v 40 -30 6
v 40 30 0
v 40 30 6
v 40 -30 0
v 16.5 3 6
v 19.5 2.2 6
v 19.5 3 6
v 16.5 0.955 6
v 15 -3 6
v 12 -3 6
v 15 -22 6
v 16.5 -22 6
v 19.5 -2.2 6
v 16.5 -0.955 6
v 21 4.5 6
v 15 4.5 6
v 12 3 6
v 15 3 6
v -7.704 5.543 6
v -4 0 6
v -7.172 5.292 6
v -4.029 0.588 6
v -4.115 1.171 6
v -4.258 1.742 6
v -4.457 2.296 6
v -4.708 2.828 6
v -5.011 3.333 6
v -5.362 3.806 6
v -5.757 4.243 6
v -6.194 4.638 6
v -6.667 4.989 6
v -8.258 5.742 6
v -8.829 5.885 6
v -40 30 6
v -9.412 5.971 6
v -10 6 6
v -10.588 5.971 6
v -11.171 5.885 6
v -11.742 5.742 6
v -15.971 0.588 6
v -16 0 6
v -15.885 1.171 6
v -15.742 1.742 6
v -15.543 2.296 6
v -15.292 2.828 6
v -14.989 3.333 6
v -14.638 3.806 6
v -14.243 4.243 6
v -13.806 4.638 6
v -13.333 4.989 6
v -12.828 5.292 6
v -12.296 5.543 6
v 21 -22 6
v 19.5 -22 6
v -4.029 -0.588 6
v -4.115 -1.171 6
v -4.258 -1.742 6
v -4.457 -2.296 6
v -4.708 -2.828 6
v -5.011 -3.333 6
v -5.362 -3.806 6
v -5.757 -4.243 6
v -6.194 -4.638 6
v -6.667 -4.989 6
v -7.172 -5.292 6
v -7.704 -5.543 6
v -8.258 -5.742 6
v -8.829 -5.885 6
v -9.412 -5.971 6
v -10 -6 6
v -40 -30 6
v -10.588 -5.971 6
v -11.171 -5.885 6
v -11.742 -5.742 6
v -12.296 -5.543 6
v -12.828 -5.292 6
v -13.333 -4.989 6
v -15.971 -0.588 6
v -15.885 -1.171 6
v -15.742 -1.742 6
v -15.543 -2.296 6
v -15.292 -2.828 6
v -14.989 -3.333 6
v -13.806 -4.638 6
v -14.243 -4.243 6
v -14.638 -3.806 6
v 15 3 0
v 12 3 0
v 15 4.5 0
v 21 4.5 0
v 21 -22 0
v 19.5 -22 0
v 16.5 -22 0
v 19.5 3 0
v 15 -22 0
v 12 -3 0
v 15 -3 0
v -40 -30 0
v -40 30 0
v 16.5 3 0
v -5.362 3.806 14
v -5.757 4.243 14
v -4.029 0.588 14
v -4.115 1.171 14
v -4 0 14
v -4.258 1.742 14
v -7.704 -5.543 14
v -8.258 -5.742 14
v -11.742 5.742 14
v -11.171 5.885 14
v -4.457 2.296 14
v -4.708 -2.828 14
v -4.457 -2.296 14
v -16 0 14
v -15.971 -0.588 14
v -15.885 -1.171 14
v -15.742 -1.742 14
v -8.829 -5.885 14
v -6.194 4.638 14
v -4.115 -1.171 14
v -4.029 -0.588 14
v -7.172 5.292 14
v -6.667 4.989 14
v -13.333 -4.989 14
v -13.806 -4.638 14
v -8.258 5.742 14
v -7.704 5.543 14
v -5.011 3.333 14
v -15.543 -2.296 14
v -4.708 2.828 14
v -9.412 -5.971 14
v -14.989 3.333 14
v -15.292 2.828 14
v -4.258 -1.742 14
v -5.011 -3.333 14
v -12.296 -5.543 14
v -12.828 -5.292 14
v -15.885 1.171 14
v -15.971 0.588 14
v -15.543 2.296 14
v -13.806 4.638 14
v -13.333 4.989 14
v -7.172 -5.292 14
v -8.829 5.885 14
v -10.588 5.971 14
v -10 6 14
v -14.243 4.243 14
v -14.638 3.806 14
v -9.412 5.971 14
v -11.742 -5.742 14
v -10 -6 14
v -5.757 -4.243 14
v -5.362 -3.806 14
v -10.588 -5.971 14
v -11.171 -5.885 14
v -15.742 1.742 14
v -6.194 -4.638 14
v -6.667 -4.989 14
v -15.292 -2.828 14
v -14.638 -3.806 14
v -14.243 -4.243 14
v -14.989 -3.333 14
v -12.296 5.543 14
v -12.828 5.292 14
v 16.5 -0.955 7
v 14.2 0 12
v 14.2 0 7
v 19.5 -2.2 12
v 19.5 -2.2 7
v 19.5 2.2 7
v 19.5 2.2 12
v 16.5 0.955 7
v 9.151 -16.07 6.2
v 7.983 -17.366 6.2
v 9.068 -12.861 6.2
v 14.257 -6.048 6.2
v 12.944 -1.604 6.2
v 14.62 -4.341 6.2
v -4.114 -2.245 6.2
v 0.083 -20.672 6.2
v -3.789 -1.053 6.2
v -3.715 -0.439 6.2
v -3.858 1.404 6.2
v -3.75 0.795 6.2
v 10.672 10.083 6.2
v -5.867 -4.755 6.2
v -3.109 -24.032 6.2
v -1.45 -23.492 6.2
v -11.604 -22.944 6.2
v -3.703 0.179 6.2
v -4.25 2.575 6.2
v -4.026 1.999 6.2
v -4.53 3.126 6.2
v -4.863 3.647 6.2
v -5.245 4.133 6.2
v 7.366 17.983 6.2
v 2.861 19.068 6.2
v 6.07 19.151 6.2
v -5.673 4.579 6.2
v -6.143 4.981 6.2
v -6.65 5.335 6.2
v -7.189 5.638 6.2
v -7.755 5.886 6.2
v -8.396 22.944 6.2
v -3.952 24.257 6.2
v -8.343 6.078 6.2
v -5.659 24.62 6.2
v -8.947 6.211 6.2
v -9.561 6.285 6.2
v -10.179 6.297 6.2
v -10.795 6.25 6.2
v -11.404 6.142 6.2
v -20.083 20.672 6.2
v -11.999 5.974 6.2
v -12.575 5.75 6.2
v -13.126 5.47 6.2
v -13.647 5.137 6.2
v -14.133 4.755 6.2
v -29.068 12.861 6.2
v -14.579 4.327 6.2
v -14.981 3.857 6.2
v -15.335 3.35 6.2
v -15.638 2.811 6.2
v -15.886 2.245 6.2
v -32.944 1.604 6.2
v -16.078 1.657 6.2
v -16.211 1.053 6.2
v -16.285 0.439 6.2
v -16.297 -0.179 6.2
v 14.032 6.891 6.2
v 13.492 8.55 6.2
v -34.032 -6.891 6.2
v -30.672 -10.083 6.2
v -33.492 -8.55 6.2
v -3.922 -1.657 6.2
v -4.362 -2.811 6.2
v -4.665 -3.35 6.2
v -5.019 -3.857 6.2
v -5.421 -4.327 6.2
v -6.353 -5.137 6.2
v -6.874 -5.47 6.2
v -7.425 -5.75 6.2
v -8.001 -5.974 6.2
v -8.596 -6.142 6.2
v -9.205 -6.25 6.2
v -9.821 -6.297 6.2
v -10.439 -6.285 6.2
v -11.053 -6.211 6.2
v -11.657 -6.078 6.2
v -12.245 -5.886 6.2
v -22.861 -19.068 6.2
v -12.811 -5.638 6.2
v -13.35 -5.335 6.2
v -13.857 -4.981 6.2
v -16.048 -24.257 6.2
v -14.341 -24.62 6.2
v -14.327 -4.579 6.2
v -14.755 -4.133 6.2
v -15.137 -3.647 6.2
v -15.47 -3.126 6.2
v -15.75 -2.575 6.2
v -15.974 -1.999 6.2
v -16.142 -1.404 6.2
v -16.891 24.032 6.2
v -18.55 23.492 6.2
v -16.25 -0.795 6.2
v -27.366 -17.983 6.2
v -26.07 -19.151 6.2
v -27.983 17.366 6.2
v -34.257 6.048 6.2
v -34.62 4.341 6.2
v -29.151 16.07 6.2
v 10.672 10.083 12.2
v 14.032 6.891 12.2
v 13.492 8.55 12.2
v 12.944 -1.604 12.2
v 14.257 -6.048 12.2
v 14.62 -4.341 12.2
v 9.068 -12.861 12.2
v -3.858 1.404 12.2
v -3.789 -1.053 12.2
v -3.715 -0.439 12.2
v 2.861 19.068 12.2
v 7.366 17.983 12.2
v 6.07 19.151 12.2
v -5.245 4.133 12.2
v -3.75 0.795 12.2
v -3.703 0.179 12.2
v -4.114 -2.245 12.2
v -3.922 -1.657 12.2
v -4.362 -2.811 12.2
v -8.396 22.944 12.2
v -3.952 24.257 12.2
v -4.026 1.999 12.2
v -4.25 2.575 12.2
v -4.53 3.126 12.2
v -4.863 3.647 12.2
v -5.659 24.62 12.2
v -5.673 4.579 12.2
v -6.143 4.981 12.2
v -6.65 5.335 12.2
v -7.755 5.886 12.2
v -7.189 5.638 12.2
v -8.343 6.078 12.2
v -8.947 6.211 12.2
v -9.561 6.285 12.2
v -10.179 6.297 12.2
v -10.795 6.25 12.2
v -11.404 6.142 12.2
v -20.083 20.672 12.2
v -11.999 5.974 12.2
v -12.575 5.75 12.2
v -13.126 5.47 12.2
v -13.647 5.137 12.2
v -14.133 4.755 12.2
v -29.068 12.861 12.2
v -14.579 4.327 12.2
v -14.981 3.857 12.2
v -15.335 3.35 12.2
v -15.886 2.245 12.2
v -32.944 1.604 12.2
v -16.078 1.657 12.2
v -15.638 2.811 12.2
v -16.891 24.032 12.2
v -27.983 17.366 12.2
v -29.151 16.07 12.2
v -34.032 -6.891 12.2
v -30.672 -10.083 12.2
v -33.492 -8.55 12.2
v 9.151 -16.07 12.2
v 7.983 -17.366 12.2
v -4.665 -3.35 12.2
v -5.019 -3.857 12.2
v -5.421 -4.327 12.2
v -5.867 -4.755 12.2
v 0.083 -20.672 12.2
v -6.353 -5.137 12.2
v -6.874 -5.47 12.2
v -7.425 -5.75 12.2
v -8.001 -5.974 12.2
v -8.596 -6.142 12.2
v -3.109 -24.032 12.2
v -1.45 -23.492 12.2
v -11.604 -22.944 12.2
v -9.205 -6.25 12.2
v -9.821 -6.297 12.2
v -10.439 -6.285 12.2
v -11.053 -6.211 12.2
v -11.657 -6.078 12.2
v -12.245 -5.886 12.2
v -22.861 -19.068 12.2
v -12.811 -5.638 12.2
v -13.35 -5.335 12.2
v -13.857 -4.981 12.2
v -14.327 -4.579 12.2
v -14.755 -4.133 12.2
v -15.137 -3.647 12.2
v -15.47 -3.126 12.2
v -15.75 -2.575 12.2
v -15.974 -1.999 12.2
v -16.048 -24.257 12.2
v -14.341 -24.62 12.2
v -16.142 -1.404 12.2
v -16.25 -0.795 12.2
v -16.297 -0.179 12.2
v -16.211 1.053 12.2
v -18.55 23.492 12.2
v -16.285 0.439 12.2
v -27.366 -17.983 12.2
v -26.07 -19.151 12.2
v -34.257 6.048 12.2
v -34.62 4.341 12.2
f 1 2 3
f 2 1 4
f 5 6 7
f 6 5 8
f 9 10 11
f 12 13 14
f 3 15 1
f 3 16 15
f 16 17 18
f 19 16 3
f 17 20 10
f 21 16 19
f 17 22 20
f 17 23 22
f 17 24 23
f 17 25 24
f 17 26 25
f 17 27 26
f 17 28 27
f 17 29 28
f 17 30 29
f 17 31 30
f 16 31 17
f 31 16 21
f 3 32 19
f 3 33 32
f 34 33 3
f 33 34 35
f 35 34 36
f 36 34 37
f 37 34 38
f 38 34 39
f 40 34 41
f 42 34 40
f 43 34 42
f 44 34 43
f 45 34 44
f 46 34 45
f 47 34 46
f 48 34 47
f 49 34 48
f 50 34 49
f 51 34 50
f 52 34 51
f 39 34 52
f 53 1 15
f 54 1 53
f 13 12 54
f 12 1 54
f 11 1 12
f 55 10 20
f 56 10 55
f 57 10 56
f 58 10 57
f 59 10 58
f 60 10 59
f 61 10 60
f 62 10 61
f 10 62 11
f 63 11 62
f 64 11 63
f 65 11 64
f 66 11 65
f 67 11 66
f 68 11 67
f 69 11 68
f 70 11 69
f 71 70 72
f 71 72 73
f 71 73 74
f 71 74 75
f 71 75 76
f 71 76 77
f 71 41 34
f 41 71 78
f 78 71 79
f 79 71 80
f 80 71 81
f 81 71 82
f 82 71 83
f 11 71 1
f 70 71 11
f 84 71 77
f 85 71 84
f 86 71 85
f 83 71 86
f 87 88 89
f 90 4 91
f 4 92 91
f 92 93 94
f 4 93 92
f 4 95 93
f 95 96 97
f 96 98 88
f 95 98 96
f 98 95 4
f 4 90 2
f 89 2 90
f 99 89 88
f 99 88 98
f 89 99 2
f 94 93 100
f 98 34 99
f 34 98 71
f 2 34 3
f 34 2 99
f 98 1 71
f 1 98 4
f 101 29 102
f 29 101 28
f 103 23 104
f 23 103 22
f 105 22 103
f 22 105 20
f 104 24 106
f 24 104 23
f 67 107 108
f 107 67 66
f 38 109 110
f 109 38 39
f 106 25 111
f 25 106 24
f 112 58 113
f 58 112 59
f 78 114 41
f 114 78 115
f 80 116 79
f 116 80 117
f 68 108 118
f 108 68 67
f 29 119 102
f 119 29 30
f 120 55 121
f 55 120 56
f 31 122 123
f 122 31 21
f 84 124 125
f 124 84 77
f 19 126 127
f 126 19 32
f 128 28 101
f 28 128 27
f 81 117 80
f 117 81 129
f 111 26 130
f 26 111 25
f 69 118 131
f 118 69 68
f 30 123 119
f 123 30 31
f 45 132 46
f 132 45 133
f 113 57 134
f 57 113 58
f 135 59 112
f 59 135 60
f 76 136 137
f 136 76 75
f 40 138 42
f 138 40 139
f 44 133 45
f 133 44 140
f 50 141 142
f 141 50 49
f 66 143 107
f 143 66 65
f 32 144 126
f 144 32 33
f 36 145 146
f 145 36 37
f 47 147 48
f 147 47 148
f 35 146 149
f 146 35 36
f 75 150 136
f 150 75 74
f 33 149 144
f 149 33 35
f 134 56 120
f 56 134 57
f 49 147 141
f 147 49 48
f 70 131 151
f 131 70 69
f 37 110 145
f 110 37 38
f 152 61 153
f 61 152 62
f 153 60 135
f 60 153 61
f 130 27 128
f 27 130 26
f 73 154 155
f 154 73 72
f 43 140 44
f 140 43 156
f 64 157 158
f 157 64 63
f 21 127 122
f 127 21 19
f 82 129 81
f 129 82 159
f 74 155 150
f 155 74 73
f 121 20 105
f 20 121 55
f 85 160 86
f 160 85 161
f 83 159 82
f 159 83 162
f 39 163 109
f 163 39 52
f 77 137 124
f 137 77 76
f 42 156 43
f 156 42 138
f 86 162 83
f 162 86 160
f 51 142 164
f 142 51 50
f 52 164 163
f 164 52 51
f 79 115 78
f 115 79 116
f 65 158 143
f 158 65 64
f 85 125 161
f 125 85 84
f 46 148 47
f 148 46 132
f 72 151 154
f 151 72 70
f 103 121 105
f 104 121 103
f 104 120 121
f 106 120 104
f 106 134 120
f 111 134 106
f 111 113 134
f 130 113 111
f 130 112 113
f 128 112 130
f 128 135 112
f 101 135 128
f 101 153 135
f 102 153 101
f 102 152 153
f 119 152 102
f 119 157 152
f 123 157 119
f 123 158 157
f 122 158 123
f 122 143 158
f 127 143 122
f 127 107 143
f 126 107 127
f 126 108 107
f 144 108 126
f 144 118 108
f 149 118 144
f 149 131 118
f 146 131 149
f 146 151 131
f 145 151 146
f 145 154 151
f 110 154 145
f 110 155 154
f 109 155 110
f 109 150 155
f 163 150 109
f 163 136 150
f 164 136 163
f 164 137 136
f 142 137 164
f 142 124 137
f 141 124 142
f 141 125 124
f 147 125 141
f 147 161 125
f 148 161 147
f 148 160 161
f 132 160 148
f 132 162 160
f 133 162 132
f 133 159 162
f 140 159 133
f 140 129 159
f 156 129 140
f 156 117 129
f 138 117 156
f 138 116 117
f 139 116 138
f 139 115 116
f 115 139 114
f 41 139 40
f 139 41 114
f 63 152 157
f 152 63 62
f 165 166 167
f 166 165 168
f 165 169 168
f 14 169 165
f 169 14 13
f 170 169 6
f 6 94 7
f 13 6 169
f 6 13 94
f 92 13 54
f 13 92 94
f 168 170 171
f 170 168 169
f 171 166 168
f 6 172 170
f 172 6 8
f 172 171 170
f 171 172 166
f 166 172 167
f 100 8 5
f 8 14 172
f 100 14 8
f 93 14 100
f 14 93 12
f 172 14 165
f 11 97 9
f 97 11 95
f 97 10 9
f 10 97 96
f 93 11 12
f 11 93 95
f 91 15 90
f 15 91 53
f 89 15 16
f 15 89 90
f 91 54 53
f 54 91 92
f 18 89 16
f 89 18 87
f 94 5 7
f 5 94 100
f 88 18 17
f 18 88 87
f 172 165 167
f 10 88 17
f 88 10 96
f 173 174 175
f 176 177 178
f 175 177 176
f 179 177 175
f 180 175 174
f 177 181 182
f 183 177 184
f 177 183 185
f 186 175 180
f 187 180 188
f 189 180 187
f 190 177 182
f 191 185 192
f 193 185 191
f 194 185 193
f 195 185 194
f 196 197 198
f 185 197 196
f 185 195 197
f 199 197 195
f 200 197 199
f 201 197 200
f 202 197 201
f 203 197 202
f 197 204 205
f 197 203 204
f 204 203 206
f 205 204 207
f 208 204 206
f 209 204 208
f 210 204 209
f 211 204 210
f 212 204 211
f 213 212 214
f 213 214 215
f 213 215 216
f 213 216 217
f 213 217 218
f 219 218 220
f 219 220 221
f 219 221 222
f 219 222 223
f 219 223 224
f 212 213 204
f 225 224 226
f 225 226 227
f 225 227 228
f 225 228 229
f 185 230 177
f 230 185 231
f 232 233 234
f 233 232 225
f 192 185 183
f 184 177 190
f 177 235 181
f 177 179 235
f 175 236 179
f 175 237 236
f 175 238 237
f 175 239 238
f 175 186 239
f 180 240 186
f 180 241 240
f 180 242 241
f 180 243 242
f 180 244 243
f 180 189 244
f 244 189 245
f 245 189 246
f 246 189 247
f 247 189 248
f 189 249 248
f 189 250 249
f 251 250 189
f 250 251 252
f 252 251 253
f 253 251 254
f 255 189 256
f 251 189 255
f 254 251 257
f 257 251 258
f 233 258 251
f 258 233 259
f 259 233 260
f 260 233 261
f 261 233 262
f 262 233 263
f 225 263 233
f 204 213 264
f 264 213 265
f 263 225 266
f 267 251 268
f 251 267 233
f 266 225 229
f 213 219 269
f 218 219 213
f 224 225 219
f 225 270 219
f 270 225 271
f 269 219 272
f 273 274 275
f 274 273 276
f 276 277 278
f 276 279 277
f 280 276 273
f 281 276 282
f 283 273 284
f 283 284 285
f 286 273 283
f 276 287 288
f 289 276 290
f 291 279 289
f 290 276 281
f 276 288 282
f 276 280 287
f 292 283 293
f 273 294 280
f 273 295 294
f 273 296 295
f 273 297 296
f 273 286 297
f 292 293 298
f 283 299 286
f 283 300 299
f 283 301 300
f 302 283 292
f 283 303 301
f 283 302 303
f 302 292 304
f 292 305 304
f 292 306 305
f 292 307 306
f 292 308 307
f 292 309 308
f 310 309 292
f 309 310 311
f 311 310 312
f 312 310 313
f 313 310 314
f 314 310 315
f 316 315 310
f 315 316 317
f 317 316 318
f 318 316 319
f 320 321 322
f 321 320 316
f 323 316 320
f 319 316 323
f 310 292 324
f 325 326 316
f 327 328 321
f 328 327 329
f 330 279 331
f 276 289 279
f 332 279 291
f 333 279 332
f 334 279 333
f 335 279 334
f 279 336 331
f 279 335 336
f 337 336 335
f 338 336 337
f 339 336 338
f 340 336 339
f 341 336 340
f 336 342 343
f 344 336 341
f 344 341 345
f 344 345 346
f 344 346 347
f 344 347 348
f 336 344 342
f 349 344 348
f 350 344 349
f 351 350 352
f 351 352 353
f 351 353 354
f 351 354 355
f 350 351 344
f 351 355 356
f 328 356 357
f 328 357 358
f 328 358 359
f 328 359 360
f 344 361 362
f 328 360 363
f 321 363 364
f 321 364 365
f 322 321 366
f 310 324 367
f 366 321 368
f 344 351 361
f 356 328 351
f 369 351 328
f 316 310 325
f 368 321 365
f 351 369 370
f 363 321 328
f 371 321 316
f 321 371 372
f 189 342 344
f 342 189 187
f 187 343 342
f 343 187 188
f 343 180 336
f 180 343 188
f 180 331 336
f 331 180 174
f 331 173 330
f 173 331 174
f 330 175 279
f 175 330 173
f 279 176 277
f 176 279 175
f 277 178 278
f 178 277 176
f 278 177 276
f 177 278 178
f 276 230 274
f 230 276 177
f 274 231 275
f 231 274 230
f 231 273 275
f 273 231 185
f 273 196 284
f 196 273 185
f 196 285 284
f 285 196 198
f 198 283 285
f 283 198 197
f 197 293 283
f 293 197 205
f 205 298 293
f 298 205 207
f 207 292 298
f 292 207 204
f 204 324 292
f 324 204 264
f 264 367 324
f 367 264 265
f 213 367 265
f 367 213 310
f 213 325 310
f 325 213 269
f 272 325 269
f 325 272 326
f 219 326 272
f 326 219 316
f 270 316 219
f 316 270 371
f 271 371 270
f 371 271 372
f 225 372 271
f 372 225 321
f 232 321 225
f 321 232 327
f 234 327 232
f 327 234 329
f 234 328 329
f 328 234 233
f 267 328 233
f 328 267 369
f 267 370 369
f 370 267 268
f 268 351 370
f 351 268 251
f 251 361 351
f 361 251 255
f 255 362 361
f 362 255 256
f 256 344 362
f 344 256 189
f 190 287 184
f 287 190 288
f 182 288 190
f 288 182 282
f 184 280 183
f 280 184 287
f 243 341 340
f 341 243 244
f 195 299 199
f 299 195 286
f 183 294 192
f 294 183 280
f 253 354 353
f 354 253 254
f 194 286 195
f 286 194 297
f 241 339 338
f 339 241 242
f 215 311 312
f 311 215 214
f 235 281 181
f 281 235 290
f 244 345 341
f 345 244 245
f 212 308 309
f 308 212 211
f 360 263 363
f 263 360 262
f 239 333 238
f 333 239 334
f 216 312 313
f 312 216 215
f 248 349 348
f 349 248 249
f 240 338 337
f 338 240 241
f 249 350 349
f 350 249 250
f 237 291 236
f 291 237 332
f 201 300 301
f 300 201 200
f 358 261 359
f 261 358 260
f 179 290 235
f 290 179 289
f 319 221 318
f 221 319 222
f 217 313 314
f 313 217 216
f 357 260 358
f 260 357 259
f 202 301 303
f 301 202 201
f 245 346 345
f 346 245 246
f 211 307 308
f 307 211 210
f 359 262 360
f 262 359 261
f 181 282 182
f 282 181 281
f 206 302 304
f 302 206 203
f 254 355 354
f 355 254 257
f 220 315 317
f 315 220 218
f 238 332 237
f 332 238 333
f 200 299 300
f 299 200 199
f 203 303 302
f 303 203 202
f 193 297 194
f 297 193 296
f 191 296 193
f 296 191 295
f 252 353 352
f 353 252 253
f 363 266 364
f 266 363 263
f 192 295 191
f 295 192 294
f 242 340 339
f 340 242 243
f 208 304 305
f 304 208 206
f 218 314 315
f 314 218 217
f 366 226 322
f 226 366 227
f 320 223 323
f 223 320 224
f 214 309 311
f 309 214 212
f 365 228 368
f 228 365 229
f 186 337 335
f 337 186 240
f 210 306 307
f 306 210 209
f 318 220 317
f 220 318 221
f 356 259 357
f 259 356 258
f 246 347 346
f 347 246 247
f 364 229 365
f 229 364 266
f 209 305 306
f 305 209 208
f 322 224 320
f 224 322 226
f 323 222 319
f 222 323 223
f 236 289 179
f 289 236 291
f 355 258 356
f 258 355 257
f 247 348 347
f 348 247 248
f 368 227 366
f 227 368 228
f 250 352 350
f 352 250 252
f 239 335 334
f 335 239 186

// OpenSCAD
/* Ratchet wheel with spring pawl - desk demo, PLA, 0.4mm nozzle, no supports.
   Wheel (~50mm, 12 teeth) turns on a post; pawl on a flexible arm cut from the
   base plate bends aside as teeth pass (free way) and blocks reverse.
   Free way: clockwise seen from above (+z), i.e. negative rotation about +z. */
part = "assembly"; // [wheel:Wheel, base:Base, assembly:Assembly]

cadverify_only = "";
module instance(name, part, unit = 1) {
    echo(cadverify_instance = [name, part, unit]);
    if (cadverify_only == "" || cadverify_only == name) children();
}

// ---------- parameters (mm) ----------
Rtip = 25;          // wheel outer radius (50 mm across)
Rroot = 23;         // wheel root radius (tooth height 2 mm)
wheel_t = 6;        // wheel thickness
hole_D = 12.6;      // wheel centre hole diameter
post_D = 12;        // base post diameter (0.6 mm play)
post_h = 8;         // post height above base top
base_t = 6;         // base plate thickness
base_x = 80;
base_y = 60;
wheel_cx = -10;     // wheel centre in base/assembly XY
wheel_cy = 0;
wheel_gap = 0.2;    // wheel bottom above base top
wheel_lift_z = base_t + wheel_gap;   // 6.2 wheel bottom in assembly
post_top_z = base_t + post_h;        // 14
pawl_tip_x = 14.2;  // pawl tip (0.8 mm inside tip circle, 1.2 mm off root)
beam_x0 = 16.5; beam_x1 = 19.5;      // flexible arm: 3 mm wide ...
beam_y0 = -22; beam_y1 = 3;          // ... 25 mm long, fixed at south, free at north
slot_w = 1.5;       // slot width (clears a 0.4 mm nozzle)
pawl_h = 6;         // pawl height above plate (meets the wheel band 6.2..12.2)
rest_angle = -4.0;  // wheel rest rotation: gullet centred on pawl tip

// tooth k: root at 30k, shallow rise to tip at 30k+20, tip land to +24, steep drop to root at 30k+30
function wheel_pts() = [
    for(k=[0:11]) for(j=[0:2])
        j==0 ? [Rroot*cos(k*30), Rroot*sin(k*30)]
      : j==1 ? [Rtip*cos(k*30+20), Rtip*sin(k*30+20)]
             : [Rtip*cos(k*30+24), Rtip*sin(k*30+24)]
];

module wheel() {
    difference() {
        linear_extrude(height=wheel_t, convexity=4)
            polygon(points=wheel_pts());
        translate([0,0,-1]) cylinder(d=hole_D, h=wheel_t+2, $fn=64);
    }
}

module base() {
    difference() {
        union() {
            // plate
            translate([-base_x/2, -base_y/2, 0]) cube([base_x, base_y, base_t]);
            // post the wheel turns on
            translate([wheel_cx, wheel_cy, base_t]) cylinder(d=post_D, h=post_h, $fn=64);
            // pawl wedge: tip near the wheel, root fused onto the free end of the arm
            translate([0,0,base_t]) linear_extrude(height=pawl_h, convexity=2)
                polygon(points=[[pawl_tip_x, 0],[beam_x1, 2.2],[beam_x1, -2.2]]);
        }
        // U-slot freeing the arm (one connected through opening) + window under pawl tip
        translate([beam_x0-slot_w, beam_y0, -1]) cube([slot_w, 19, base_t+2]); // west x15..16.5 y-22..-3
        translate([beam_x1, beam_y0, -1]) cube([slot_w, 26.5, base_t+2]);       // east x19.5..21 y-22..4.5
        translate([beam_x0-slot_w, beam_y1, -1]) cube([6, slot_w, base_t+2]);   // north x15..21 y3..4.5
        translate([12, -3, -1]) cube([4.5, 6, base_t+2]);                        // window x12..16.5 y-3..3
    }
}

module assembly() {
    instance("base_inst", "base", 1) base();
    instance("wheel_inst", "wheel", 1)
        translate([wheel_cx, wheel_cy, wheel_lift_z]) rotate([0,0,rest_angle]) wheel();
}

// ---------- specs (computed from parameters) ----------
wheel_spec = [
    ["bounds", [[-Rtip, -Rtip, 0], [Rtip, Rtip, wheel_t]]],
    ["bodies", 1],
    ["through_holes", 1],
    ["support_faces", [["bed", "-z", 800]]],
    ["overhangs_allowed", []],
    ["copies", 1],
    ["details", [
        ["axle_hole", "hole", [0, 0, wheel_t+4], [0, 0, -1], [[0, hole_D], [wheel_t, hole_D]]],
        ["rim_thick", "thickness", [15, 0, wheel_t+4], [0, 0, -1], wheel_t],
        ["tooth0", "material", [[22.9, 8.0, 0], [24.1, 9.1, wheel_t]], 0.2],
        ["tooth4", "material", [[-19.8, 15.5, 0], [-18.5, 16.6, wheel_t]], 0.2],
        ["tooth8", "material", [[-5.0, -25.2, 0], [-3.7, -24.0, wheel_t]], 0.2]
    ]]
];

base_spec = [
    ["bounds", [[-base_x/2, -base_y/2, 0], [base_x/2, base_y/2, post_top_z]]],
    ["bodies", 1],
    ["through_holes", 1],
    ["support_faces", [["bed", "-z", 2000]]],
    ["overhangs_allowed", [["pawl bridges slot", [[14, -1.5, 5.9], [17, 1.5, 6.1]]]]],
    ["copies", 1],
    ["details", [
        ["plate_thick", "thickness", [0, -28, base_t+4], [0, 0, -1], base_t],
        ["post_dia", "thickness", [wheel_cx-10, wheel_cy, 13], [1, 0, 0], post_D],
        ["post_core", "material", [[wheel_cx-2, -2, 8], [wheel_cx+2, 2, 13]], 0.8],
        ["arm_block", "material", [[17, -20, 0], [19, -12, base_t]], 0.8],
        ["slot_gap", "void", [[beam_x0-slot_w, -20, 0], [beam_x0, -10, base_t]], 0.8],
        ["window_void", "void", [[12.5, -2.5, 0], [16, 2.5, base_t]], 0.8],
        ["pawl_tip", "material", [[14.5, -0.4, 8], [15.5, 0.4, 11]], 0.5],
        ["pawl_tip_height", "thickness", [14.5, 0, base_t+pawl_h+3], [0, 0, -1], pawl_h]
    ]]
];

assembly_spec = [
    ["bounds", [[-base_x/2, -base_y/2, 0], [base_x/2, base_y/2, post_top_z]]],
    ["support_faces", [["desk", "-z", 2000]]],
    ["allowed_interferences", []],
    ["motions", [
        ["spin_free", ["wheel_inst"], "rotate", [wheel_cx, wheel_cy, wheel_lift_z], [0, 0, 1], [0, -360],
            ["flex", [["wheel_inst", "base_inst", 0.9, "pawl clicks over teeth"]]]]
    ]],
    ["assembly_order", [
        [["base_inst"], [0, 0, 0]],
        [["wheel_inst"], [0, 0, -1]]
    ]]
];

if (part == "wheel") {
    echo(cadverify_spec = wheel_spec);
    wheel();
} else if (part == "base") {
    echo(cadverify_spec = base_spec);
    base();
} else {
    echo(cadverify_spec = assembly_spec);
    assembly();
}
